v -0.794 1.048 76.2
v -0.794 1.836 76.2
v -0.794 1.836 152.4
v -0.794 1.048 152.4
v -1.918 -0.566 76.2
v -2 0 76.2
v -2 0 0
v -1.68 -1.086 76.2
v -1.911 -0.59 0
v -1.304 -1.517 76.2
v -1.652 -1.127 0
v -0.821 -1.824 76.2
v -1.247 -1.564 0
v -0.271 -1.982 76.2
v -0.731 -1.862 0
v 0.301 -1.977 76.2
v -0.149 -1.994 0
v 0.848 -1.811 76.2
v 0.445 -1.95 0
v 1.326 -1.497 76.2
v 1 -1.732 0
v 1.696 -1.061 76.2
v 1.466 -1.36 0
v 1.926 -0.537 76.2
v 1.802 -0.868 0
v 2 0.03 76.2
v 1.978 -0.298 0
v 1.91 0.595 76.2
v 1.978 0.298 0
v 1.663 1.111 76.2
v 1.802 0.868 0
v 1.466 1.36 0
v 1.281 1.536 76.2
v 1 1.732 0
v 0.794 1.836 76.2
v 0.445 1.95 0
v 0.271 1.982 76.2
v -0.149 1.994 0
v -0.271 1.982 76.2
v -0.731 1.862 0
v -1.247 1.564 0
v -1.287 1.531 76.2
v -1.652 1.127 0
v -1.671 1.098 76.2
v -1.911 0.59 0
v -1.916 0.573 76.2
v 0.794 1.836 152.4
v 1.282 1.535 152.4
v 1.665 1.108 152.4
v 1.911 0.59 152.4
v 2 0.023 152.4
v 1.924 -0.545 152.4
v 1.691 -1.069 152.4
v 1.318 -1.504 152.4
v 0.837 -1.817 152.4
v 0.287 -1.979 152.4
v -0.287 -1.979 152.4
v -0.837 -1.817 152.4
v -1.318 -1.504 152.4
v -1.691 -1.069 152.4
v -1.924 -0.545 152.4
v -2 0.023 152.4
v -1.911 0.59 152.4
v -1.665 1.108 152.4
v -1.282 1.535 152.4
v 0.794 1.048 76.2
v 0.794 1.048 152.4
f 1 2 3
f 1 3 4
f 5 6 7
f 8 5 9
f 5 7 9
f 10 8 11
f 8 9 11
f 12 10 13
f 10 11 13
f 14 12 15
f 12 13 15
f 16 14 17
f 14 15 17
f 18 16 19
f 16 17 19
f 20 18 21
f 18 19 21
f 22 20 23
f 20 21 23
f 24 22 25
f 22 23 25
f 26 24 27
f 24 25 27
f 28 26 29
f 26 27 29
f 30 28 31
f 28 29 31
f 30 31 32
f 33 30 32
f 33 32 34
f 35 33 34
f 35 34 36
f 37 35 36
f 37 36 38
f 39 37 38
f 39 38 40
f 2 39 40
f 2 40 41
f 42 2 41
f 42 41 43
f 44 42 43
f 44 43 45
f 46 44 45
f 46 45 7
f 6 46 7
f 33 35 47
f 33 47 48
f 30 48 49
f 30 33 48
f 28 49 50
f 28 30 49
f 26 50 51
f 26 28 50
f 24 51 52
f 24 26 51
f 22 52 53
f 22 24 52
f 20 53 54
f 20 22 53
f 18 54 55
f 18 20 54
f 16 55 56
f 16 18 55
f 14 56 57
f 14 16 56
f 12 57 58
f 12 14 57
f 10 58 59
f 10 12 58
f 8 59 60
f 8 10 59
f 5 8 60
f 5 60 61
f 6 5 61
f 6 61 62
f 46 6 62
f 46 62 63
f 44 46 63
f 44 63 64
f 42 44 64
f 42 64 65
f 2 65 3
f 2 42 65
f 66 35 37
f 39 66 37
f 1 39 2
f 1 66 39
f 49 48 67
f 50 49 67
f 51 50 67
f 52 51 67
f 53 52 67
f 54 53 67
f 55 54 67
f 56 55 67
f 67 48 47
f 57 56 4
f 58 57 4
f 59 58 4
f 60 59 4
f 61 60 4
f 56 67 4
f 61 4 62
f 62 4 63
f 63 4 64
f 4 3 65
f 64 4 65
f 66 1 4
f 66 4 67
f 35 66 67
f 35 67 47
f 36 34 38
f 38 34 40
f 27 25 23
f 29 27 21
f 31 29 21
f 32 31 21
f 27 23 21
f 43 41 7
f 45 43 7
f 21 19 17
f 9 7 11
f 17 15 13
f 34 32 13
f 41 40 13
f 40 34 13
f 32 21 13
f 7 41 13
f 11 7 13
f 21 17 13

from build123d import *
from build123d.topology import SkipClean

# Parameters (mm, degrees)
SKETCH1_R           = 2
BOSS_EXTRUDE1_DEPTH = 76.2
BOSS_EXTRUDE2_DEPTH = 76.2


with BuildPart() as part:
    # Sketch1 → Boss-Extrude1 (new body)
    with BuildSketch(Plane.XY):
        with Locations(Location((0, 0, 0), (0, 0, 180))):
            Circle(SKETCH1_R)
    extrude(amount=BOSS_EXTRUDE1_DEPTH)

    # Sketch2 → Boss-Extrude2 (add)
    with SkipClean():  # the faces are left unmerged after this step: merging them gives an invalid solid
        with BuildSketch(Plane.XY.offset(76.2)):
            with BuildLine():
                Line((-0.79375, 1.835745336), (-0.79375, 1.0475))
                Line((-0.79375, 1.0475), (0.79375, 1.0475))
                Line((0.79375, 1.0475), (0.79375, 1.835745336))
                ThreePointArc((0.79375, 1.835745336), (0, -2), (-0.79375, 1.835745336))
            make_face()
        extrude(amount=BOSS_EXTRUDE2_DEPTH)


solid = part.part
